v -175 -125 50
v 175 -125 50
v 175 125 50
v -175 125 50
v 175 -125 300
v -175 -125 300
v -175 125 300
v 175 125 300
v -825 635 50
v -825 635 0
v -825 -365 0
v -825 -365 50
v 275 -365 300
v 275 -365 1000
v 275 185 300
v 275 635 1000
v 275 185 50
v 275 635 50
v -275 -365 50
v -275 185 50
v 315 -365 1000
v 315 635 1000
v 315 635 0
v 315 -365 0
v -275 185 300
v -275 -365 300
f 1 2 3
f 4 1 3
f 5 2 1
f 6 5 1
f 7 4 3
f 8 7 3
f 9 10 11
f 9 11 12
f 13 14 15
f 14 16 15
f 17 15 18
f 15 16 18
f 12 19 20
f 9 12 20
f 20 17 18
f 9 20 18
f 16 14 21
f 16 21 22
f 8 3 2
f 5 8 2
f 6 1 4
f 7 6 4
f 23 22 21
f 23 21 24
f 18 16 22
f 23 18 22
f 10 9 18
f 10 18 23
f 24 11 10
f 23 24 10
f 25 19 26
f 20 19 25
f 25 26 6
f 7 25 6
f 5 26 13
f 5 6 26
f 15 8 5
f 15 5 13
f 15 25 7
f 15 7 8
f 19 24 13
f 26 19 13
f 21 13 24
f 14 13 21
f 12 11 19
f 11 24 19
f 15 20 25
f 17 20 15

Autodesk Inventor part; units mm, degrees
ref_plane "YZ Plane" through (0, 0, 0) normal (1, 0, 0) x (0, 1, 0)
ref_plane "XZ Plane" through (0, 0, 0) normal (0, 1, 0) x (-1, 0, 0)
ref_plane "XY Plane" through (0, 0, 0) normal (0, 0, 1) x (1, 0, 0)
sketch "Boceto1" plane through (0, 0, 0) normal (0, 0, 1) x (1, 0, 0)
  line L0 (175, -125) -> (-175, -125)
  line L1 (-175, -125) -> (-175, 125)
  line L2 (-175, 125) -> (175, 125)
  line L3 (175, 125) -> (175, -125)
  line L4 (175, -125) -> (-175, 125) construction
  line L5 (-175, -125) -> (175, 125) construction
  line L6 (-175, 125) -> (-165, 125) construction
  line L7 (-175, 125) -> (-275, 125)
  line L8 (-275, 125) -> (-275, 185)
  line L9 (-275, 185) -> (-175, 185)
  line L10 (-175, 185) -> (-175, 125)
  line L11 (-275, 185) -> (275, 185)
  line L12 (275, 185) -> (275, -365)
  line L13 (275, -365) -> (-275, -365)
  line L14 (-275, -365) -> (-275, 185)
  point P0 (0, 0)
  dimension "d0" = 350
  dimension "d1" = 250
  dimension "d4" = 100
  dimension "d5" = 60
  dimension "d6" = 550
  dimension "d7" = 550
extrude "Extrusión1" add sketch "Boceto1" along normal blind 300
extrude "Extrusión2" add sketch "Boceto1" along normal blind 49 contours L0 L1 L2 L3
sketch "Boceto2" plane through (-275, -365, 0) normal (-1, 0, 0) x (0, 0, 1)
  line L0 (0, 550) -> (0, 0) projected
  line L1 (0, 0) -> (50, 0)
  line L2 (50, 0) -> (50, 1000)
  line L3 (50, 1000) -> (0, 1000)
  line L4 (0, 1000) -> (0, 0)
  point P0 (0, 365)
  dimension "d12" = 50
  dimension "d13" = 1000
extrude "Extrusión3" add sketch "Boceto2" along normal mid plane 1100
sketch "Boceto3" plane through (275, -365, 300) normal (1, 0, 0) x (0, 0, -1)
  line L0 (300, 0) -> (300, 1000) projected
  line L1 (300, 0) -> (-700, 0)
  line L2 (-700, 0) -> (-700, 1000)
  line L3 (-700, 1000) -> (300, 1000)
  line L4 (300, 1000) -> (300, 0)
  point P0 (300, 365)
  dimension "d16" = 1000
extrude "Extrusión4" add sketch "Boceto3" along normal blind 40
